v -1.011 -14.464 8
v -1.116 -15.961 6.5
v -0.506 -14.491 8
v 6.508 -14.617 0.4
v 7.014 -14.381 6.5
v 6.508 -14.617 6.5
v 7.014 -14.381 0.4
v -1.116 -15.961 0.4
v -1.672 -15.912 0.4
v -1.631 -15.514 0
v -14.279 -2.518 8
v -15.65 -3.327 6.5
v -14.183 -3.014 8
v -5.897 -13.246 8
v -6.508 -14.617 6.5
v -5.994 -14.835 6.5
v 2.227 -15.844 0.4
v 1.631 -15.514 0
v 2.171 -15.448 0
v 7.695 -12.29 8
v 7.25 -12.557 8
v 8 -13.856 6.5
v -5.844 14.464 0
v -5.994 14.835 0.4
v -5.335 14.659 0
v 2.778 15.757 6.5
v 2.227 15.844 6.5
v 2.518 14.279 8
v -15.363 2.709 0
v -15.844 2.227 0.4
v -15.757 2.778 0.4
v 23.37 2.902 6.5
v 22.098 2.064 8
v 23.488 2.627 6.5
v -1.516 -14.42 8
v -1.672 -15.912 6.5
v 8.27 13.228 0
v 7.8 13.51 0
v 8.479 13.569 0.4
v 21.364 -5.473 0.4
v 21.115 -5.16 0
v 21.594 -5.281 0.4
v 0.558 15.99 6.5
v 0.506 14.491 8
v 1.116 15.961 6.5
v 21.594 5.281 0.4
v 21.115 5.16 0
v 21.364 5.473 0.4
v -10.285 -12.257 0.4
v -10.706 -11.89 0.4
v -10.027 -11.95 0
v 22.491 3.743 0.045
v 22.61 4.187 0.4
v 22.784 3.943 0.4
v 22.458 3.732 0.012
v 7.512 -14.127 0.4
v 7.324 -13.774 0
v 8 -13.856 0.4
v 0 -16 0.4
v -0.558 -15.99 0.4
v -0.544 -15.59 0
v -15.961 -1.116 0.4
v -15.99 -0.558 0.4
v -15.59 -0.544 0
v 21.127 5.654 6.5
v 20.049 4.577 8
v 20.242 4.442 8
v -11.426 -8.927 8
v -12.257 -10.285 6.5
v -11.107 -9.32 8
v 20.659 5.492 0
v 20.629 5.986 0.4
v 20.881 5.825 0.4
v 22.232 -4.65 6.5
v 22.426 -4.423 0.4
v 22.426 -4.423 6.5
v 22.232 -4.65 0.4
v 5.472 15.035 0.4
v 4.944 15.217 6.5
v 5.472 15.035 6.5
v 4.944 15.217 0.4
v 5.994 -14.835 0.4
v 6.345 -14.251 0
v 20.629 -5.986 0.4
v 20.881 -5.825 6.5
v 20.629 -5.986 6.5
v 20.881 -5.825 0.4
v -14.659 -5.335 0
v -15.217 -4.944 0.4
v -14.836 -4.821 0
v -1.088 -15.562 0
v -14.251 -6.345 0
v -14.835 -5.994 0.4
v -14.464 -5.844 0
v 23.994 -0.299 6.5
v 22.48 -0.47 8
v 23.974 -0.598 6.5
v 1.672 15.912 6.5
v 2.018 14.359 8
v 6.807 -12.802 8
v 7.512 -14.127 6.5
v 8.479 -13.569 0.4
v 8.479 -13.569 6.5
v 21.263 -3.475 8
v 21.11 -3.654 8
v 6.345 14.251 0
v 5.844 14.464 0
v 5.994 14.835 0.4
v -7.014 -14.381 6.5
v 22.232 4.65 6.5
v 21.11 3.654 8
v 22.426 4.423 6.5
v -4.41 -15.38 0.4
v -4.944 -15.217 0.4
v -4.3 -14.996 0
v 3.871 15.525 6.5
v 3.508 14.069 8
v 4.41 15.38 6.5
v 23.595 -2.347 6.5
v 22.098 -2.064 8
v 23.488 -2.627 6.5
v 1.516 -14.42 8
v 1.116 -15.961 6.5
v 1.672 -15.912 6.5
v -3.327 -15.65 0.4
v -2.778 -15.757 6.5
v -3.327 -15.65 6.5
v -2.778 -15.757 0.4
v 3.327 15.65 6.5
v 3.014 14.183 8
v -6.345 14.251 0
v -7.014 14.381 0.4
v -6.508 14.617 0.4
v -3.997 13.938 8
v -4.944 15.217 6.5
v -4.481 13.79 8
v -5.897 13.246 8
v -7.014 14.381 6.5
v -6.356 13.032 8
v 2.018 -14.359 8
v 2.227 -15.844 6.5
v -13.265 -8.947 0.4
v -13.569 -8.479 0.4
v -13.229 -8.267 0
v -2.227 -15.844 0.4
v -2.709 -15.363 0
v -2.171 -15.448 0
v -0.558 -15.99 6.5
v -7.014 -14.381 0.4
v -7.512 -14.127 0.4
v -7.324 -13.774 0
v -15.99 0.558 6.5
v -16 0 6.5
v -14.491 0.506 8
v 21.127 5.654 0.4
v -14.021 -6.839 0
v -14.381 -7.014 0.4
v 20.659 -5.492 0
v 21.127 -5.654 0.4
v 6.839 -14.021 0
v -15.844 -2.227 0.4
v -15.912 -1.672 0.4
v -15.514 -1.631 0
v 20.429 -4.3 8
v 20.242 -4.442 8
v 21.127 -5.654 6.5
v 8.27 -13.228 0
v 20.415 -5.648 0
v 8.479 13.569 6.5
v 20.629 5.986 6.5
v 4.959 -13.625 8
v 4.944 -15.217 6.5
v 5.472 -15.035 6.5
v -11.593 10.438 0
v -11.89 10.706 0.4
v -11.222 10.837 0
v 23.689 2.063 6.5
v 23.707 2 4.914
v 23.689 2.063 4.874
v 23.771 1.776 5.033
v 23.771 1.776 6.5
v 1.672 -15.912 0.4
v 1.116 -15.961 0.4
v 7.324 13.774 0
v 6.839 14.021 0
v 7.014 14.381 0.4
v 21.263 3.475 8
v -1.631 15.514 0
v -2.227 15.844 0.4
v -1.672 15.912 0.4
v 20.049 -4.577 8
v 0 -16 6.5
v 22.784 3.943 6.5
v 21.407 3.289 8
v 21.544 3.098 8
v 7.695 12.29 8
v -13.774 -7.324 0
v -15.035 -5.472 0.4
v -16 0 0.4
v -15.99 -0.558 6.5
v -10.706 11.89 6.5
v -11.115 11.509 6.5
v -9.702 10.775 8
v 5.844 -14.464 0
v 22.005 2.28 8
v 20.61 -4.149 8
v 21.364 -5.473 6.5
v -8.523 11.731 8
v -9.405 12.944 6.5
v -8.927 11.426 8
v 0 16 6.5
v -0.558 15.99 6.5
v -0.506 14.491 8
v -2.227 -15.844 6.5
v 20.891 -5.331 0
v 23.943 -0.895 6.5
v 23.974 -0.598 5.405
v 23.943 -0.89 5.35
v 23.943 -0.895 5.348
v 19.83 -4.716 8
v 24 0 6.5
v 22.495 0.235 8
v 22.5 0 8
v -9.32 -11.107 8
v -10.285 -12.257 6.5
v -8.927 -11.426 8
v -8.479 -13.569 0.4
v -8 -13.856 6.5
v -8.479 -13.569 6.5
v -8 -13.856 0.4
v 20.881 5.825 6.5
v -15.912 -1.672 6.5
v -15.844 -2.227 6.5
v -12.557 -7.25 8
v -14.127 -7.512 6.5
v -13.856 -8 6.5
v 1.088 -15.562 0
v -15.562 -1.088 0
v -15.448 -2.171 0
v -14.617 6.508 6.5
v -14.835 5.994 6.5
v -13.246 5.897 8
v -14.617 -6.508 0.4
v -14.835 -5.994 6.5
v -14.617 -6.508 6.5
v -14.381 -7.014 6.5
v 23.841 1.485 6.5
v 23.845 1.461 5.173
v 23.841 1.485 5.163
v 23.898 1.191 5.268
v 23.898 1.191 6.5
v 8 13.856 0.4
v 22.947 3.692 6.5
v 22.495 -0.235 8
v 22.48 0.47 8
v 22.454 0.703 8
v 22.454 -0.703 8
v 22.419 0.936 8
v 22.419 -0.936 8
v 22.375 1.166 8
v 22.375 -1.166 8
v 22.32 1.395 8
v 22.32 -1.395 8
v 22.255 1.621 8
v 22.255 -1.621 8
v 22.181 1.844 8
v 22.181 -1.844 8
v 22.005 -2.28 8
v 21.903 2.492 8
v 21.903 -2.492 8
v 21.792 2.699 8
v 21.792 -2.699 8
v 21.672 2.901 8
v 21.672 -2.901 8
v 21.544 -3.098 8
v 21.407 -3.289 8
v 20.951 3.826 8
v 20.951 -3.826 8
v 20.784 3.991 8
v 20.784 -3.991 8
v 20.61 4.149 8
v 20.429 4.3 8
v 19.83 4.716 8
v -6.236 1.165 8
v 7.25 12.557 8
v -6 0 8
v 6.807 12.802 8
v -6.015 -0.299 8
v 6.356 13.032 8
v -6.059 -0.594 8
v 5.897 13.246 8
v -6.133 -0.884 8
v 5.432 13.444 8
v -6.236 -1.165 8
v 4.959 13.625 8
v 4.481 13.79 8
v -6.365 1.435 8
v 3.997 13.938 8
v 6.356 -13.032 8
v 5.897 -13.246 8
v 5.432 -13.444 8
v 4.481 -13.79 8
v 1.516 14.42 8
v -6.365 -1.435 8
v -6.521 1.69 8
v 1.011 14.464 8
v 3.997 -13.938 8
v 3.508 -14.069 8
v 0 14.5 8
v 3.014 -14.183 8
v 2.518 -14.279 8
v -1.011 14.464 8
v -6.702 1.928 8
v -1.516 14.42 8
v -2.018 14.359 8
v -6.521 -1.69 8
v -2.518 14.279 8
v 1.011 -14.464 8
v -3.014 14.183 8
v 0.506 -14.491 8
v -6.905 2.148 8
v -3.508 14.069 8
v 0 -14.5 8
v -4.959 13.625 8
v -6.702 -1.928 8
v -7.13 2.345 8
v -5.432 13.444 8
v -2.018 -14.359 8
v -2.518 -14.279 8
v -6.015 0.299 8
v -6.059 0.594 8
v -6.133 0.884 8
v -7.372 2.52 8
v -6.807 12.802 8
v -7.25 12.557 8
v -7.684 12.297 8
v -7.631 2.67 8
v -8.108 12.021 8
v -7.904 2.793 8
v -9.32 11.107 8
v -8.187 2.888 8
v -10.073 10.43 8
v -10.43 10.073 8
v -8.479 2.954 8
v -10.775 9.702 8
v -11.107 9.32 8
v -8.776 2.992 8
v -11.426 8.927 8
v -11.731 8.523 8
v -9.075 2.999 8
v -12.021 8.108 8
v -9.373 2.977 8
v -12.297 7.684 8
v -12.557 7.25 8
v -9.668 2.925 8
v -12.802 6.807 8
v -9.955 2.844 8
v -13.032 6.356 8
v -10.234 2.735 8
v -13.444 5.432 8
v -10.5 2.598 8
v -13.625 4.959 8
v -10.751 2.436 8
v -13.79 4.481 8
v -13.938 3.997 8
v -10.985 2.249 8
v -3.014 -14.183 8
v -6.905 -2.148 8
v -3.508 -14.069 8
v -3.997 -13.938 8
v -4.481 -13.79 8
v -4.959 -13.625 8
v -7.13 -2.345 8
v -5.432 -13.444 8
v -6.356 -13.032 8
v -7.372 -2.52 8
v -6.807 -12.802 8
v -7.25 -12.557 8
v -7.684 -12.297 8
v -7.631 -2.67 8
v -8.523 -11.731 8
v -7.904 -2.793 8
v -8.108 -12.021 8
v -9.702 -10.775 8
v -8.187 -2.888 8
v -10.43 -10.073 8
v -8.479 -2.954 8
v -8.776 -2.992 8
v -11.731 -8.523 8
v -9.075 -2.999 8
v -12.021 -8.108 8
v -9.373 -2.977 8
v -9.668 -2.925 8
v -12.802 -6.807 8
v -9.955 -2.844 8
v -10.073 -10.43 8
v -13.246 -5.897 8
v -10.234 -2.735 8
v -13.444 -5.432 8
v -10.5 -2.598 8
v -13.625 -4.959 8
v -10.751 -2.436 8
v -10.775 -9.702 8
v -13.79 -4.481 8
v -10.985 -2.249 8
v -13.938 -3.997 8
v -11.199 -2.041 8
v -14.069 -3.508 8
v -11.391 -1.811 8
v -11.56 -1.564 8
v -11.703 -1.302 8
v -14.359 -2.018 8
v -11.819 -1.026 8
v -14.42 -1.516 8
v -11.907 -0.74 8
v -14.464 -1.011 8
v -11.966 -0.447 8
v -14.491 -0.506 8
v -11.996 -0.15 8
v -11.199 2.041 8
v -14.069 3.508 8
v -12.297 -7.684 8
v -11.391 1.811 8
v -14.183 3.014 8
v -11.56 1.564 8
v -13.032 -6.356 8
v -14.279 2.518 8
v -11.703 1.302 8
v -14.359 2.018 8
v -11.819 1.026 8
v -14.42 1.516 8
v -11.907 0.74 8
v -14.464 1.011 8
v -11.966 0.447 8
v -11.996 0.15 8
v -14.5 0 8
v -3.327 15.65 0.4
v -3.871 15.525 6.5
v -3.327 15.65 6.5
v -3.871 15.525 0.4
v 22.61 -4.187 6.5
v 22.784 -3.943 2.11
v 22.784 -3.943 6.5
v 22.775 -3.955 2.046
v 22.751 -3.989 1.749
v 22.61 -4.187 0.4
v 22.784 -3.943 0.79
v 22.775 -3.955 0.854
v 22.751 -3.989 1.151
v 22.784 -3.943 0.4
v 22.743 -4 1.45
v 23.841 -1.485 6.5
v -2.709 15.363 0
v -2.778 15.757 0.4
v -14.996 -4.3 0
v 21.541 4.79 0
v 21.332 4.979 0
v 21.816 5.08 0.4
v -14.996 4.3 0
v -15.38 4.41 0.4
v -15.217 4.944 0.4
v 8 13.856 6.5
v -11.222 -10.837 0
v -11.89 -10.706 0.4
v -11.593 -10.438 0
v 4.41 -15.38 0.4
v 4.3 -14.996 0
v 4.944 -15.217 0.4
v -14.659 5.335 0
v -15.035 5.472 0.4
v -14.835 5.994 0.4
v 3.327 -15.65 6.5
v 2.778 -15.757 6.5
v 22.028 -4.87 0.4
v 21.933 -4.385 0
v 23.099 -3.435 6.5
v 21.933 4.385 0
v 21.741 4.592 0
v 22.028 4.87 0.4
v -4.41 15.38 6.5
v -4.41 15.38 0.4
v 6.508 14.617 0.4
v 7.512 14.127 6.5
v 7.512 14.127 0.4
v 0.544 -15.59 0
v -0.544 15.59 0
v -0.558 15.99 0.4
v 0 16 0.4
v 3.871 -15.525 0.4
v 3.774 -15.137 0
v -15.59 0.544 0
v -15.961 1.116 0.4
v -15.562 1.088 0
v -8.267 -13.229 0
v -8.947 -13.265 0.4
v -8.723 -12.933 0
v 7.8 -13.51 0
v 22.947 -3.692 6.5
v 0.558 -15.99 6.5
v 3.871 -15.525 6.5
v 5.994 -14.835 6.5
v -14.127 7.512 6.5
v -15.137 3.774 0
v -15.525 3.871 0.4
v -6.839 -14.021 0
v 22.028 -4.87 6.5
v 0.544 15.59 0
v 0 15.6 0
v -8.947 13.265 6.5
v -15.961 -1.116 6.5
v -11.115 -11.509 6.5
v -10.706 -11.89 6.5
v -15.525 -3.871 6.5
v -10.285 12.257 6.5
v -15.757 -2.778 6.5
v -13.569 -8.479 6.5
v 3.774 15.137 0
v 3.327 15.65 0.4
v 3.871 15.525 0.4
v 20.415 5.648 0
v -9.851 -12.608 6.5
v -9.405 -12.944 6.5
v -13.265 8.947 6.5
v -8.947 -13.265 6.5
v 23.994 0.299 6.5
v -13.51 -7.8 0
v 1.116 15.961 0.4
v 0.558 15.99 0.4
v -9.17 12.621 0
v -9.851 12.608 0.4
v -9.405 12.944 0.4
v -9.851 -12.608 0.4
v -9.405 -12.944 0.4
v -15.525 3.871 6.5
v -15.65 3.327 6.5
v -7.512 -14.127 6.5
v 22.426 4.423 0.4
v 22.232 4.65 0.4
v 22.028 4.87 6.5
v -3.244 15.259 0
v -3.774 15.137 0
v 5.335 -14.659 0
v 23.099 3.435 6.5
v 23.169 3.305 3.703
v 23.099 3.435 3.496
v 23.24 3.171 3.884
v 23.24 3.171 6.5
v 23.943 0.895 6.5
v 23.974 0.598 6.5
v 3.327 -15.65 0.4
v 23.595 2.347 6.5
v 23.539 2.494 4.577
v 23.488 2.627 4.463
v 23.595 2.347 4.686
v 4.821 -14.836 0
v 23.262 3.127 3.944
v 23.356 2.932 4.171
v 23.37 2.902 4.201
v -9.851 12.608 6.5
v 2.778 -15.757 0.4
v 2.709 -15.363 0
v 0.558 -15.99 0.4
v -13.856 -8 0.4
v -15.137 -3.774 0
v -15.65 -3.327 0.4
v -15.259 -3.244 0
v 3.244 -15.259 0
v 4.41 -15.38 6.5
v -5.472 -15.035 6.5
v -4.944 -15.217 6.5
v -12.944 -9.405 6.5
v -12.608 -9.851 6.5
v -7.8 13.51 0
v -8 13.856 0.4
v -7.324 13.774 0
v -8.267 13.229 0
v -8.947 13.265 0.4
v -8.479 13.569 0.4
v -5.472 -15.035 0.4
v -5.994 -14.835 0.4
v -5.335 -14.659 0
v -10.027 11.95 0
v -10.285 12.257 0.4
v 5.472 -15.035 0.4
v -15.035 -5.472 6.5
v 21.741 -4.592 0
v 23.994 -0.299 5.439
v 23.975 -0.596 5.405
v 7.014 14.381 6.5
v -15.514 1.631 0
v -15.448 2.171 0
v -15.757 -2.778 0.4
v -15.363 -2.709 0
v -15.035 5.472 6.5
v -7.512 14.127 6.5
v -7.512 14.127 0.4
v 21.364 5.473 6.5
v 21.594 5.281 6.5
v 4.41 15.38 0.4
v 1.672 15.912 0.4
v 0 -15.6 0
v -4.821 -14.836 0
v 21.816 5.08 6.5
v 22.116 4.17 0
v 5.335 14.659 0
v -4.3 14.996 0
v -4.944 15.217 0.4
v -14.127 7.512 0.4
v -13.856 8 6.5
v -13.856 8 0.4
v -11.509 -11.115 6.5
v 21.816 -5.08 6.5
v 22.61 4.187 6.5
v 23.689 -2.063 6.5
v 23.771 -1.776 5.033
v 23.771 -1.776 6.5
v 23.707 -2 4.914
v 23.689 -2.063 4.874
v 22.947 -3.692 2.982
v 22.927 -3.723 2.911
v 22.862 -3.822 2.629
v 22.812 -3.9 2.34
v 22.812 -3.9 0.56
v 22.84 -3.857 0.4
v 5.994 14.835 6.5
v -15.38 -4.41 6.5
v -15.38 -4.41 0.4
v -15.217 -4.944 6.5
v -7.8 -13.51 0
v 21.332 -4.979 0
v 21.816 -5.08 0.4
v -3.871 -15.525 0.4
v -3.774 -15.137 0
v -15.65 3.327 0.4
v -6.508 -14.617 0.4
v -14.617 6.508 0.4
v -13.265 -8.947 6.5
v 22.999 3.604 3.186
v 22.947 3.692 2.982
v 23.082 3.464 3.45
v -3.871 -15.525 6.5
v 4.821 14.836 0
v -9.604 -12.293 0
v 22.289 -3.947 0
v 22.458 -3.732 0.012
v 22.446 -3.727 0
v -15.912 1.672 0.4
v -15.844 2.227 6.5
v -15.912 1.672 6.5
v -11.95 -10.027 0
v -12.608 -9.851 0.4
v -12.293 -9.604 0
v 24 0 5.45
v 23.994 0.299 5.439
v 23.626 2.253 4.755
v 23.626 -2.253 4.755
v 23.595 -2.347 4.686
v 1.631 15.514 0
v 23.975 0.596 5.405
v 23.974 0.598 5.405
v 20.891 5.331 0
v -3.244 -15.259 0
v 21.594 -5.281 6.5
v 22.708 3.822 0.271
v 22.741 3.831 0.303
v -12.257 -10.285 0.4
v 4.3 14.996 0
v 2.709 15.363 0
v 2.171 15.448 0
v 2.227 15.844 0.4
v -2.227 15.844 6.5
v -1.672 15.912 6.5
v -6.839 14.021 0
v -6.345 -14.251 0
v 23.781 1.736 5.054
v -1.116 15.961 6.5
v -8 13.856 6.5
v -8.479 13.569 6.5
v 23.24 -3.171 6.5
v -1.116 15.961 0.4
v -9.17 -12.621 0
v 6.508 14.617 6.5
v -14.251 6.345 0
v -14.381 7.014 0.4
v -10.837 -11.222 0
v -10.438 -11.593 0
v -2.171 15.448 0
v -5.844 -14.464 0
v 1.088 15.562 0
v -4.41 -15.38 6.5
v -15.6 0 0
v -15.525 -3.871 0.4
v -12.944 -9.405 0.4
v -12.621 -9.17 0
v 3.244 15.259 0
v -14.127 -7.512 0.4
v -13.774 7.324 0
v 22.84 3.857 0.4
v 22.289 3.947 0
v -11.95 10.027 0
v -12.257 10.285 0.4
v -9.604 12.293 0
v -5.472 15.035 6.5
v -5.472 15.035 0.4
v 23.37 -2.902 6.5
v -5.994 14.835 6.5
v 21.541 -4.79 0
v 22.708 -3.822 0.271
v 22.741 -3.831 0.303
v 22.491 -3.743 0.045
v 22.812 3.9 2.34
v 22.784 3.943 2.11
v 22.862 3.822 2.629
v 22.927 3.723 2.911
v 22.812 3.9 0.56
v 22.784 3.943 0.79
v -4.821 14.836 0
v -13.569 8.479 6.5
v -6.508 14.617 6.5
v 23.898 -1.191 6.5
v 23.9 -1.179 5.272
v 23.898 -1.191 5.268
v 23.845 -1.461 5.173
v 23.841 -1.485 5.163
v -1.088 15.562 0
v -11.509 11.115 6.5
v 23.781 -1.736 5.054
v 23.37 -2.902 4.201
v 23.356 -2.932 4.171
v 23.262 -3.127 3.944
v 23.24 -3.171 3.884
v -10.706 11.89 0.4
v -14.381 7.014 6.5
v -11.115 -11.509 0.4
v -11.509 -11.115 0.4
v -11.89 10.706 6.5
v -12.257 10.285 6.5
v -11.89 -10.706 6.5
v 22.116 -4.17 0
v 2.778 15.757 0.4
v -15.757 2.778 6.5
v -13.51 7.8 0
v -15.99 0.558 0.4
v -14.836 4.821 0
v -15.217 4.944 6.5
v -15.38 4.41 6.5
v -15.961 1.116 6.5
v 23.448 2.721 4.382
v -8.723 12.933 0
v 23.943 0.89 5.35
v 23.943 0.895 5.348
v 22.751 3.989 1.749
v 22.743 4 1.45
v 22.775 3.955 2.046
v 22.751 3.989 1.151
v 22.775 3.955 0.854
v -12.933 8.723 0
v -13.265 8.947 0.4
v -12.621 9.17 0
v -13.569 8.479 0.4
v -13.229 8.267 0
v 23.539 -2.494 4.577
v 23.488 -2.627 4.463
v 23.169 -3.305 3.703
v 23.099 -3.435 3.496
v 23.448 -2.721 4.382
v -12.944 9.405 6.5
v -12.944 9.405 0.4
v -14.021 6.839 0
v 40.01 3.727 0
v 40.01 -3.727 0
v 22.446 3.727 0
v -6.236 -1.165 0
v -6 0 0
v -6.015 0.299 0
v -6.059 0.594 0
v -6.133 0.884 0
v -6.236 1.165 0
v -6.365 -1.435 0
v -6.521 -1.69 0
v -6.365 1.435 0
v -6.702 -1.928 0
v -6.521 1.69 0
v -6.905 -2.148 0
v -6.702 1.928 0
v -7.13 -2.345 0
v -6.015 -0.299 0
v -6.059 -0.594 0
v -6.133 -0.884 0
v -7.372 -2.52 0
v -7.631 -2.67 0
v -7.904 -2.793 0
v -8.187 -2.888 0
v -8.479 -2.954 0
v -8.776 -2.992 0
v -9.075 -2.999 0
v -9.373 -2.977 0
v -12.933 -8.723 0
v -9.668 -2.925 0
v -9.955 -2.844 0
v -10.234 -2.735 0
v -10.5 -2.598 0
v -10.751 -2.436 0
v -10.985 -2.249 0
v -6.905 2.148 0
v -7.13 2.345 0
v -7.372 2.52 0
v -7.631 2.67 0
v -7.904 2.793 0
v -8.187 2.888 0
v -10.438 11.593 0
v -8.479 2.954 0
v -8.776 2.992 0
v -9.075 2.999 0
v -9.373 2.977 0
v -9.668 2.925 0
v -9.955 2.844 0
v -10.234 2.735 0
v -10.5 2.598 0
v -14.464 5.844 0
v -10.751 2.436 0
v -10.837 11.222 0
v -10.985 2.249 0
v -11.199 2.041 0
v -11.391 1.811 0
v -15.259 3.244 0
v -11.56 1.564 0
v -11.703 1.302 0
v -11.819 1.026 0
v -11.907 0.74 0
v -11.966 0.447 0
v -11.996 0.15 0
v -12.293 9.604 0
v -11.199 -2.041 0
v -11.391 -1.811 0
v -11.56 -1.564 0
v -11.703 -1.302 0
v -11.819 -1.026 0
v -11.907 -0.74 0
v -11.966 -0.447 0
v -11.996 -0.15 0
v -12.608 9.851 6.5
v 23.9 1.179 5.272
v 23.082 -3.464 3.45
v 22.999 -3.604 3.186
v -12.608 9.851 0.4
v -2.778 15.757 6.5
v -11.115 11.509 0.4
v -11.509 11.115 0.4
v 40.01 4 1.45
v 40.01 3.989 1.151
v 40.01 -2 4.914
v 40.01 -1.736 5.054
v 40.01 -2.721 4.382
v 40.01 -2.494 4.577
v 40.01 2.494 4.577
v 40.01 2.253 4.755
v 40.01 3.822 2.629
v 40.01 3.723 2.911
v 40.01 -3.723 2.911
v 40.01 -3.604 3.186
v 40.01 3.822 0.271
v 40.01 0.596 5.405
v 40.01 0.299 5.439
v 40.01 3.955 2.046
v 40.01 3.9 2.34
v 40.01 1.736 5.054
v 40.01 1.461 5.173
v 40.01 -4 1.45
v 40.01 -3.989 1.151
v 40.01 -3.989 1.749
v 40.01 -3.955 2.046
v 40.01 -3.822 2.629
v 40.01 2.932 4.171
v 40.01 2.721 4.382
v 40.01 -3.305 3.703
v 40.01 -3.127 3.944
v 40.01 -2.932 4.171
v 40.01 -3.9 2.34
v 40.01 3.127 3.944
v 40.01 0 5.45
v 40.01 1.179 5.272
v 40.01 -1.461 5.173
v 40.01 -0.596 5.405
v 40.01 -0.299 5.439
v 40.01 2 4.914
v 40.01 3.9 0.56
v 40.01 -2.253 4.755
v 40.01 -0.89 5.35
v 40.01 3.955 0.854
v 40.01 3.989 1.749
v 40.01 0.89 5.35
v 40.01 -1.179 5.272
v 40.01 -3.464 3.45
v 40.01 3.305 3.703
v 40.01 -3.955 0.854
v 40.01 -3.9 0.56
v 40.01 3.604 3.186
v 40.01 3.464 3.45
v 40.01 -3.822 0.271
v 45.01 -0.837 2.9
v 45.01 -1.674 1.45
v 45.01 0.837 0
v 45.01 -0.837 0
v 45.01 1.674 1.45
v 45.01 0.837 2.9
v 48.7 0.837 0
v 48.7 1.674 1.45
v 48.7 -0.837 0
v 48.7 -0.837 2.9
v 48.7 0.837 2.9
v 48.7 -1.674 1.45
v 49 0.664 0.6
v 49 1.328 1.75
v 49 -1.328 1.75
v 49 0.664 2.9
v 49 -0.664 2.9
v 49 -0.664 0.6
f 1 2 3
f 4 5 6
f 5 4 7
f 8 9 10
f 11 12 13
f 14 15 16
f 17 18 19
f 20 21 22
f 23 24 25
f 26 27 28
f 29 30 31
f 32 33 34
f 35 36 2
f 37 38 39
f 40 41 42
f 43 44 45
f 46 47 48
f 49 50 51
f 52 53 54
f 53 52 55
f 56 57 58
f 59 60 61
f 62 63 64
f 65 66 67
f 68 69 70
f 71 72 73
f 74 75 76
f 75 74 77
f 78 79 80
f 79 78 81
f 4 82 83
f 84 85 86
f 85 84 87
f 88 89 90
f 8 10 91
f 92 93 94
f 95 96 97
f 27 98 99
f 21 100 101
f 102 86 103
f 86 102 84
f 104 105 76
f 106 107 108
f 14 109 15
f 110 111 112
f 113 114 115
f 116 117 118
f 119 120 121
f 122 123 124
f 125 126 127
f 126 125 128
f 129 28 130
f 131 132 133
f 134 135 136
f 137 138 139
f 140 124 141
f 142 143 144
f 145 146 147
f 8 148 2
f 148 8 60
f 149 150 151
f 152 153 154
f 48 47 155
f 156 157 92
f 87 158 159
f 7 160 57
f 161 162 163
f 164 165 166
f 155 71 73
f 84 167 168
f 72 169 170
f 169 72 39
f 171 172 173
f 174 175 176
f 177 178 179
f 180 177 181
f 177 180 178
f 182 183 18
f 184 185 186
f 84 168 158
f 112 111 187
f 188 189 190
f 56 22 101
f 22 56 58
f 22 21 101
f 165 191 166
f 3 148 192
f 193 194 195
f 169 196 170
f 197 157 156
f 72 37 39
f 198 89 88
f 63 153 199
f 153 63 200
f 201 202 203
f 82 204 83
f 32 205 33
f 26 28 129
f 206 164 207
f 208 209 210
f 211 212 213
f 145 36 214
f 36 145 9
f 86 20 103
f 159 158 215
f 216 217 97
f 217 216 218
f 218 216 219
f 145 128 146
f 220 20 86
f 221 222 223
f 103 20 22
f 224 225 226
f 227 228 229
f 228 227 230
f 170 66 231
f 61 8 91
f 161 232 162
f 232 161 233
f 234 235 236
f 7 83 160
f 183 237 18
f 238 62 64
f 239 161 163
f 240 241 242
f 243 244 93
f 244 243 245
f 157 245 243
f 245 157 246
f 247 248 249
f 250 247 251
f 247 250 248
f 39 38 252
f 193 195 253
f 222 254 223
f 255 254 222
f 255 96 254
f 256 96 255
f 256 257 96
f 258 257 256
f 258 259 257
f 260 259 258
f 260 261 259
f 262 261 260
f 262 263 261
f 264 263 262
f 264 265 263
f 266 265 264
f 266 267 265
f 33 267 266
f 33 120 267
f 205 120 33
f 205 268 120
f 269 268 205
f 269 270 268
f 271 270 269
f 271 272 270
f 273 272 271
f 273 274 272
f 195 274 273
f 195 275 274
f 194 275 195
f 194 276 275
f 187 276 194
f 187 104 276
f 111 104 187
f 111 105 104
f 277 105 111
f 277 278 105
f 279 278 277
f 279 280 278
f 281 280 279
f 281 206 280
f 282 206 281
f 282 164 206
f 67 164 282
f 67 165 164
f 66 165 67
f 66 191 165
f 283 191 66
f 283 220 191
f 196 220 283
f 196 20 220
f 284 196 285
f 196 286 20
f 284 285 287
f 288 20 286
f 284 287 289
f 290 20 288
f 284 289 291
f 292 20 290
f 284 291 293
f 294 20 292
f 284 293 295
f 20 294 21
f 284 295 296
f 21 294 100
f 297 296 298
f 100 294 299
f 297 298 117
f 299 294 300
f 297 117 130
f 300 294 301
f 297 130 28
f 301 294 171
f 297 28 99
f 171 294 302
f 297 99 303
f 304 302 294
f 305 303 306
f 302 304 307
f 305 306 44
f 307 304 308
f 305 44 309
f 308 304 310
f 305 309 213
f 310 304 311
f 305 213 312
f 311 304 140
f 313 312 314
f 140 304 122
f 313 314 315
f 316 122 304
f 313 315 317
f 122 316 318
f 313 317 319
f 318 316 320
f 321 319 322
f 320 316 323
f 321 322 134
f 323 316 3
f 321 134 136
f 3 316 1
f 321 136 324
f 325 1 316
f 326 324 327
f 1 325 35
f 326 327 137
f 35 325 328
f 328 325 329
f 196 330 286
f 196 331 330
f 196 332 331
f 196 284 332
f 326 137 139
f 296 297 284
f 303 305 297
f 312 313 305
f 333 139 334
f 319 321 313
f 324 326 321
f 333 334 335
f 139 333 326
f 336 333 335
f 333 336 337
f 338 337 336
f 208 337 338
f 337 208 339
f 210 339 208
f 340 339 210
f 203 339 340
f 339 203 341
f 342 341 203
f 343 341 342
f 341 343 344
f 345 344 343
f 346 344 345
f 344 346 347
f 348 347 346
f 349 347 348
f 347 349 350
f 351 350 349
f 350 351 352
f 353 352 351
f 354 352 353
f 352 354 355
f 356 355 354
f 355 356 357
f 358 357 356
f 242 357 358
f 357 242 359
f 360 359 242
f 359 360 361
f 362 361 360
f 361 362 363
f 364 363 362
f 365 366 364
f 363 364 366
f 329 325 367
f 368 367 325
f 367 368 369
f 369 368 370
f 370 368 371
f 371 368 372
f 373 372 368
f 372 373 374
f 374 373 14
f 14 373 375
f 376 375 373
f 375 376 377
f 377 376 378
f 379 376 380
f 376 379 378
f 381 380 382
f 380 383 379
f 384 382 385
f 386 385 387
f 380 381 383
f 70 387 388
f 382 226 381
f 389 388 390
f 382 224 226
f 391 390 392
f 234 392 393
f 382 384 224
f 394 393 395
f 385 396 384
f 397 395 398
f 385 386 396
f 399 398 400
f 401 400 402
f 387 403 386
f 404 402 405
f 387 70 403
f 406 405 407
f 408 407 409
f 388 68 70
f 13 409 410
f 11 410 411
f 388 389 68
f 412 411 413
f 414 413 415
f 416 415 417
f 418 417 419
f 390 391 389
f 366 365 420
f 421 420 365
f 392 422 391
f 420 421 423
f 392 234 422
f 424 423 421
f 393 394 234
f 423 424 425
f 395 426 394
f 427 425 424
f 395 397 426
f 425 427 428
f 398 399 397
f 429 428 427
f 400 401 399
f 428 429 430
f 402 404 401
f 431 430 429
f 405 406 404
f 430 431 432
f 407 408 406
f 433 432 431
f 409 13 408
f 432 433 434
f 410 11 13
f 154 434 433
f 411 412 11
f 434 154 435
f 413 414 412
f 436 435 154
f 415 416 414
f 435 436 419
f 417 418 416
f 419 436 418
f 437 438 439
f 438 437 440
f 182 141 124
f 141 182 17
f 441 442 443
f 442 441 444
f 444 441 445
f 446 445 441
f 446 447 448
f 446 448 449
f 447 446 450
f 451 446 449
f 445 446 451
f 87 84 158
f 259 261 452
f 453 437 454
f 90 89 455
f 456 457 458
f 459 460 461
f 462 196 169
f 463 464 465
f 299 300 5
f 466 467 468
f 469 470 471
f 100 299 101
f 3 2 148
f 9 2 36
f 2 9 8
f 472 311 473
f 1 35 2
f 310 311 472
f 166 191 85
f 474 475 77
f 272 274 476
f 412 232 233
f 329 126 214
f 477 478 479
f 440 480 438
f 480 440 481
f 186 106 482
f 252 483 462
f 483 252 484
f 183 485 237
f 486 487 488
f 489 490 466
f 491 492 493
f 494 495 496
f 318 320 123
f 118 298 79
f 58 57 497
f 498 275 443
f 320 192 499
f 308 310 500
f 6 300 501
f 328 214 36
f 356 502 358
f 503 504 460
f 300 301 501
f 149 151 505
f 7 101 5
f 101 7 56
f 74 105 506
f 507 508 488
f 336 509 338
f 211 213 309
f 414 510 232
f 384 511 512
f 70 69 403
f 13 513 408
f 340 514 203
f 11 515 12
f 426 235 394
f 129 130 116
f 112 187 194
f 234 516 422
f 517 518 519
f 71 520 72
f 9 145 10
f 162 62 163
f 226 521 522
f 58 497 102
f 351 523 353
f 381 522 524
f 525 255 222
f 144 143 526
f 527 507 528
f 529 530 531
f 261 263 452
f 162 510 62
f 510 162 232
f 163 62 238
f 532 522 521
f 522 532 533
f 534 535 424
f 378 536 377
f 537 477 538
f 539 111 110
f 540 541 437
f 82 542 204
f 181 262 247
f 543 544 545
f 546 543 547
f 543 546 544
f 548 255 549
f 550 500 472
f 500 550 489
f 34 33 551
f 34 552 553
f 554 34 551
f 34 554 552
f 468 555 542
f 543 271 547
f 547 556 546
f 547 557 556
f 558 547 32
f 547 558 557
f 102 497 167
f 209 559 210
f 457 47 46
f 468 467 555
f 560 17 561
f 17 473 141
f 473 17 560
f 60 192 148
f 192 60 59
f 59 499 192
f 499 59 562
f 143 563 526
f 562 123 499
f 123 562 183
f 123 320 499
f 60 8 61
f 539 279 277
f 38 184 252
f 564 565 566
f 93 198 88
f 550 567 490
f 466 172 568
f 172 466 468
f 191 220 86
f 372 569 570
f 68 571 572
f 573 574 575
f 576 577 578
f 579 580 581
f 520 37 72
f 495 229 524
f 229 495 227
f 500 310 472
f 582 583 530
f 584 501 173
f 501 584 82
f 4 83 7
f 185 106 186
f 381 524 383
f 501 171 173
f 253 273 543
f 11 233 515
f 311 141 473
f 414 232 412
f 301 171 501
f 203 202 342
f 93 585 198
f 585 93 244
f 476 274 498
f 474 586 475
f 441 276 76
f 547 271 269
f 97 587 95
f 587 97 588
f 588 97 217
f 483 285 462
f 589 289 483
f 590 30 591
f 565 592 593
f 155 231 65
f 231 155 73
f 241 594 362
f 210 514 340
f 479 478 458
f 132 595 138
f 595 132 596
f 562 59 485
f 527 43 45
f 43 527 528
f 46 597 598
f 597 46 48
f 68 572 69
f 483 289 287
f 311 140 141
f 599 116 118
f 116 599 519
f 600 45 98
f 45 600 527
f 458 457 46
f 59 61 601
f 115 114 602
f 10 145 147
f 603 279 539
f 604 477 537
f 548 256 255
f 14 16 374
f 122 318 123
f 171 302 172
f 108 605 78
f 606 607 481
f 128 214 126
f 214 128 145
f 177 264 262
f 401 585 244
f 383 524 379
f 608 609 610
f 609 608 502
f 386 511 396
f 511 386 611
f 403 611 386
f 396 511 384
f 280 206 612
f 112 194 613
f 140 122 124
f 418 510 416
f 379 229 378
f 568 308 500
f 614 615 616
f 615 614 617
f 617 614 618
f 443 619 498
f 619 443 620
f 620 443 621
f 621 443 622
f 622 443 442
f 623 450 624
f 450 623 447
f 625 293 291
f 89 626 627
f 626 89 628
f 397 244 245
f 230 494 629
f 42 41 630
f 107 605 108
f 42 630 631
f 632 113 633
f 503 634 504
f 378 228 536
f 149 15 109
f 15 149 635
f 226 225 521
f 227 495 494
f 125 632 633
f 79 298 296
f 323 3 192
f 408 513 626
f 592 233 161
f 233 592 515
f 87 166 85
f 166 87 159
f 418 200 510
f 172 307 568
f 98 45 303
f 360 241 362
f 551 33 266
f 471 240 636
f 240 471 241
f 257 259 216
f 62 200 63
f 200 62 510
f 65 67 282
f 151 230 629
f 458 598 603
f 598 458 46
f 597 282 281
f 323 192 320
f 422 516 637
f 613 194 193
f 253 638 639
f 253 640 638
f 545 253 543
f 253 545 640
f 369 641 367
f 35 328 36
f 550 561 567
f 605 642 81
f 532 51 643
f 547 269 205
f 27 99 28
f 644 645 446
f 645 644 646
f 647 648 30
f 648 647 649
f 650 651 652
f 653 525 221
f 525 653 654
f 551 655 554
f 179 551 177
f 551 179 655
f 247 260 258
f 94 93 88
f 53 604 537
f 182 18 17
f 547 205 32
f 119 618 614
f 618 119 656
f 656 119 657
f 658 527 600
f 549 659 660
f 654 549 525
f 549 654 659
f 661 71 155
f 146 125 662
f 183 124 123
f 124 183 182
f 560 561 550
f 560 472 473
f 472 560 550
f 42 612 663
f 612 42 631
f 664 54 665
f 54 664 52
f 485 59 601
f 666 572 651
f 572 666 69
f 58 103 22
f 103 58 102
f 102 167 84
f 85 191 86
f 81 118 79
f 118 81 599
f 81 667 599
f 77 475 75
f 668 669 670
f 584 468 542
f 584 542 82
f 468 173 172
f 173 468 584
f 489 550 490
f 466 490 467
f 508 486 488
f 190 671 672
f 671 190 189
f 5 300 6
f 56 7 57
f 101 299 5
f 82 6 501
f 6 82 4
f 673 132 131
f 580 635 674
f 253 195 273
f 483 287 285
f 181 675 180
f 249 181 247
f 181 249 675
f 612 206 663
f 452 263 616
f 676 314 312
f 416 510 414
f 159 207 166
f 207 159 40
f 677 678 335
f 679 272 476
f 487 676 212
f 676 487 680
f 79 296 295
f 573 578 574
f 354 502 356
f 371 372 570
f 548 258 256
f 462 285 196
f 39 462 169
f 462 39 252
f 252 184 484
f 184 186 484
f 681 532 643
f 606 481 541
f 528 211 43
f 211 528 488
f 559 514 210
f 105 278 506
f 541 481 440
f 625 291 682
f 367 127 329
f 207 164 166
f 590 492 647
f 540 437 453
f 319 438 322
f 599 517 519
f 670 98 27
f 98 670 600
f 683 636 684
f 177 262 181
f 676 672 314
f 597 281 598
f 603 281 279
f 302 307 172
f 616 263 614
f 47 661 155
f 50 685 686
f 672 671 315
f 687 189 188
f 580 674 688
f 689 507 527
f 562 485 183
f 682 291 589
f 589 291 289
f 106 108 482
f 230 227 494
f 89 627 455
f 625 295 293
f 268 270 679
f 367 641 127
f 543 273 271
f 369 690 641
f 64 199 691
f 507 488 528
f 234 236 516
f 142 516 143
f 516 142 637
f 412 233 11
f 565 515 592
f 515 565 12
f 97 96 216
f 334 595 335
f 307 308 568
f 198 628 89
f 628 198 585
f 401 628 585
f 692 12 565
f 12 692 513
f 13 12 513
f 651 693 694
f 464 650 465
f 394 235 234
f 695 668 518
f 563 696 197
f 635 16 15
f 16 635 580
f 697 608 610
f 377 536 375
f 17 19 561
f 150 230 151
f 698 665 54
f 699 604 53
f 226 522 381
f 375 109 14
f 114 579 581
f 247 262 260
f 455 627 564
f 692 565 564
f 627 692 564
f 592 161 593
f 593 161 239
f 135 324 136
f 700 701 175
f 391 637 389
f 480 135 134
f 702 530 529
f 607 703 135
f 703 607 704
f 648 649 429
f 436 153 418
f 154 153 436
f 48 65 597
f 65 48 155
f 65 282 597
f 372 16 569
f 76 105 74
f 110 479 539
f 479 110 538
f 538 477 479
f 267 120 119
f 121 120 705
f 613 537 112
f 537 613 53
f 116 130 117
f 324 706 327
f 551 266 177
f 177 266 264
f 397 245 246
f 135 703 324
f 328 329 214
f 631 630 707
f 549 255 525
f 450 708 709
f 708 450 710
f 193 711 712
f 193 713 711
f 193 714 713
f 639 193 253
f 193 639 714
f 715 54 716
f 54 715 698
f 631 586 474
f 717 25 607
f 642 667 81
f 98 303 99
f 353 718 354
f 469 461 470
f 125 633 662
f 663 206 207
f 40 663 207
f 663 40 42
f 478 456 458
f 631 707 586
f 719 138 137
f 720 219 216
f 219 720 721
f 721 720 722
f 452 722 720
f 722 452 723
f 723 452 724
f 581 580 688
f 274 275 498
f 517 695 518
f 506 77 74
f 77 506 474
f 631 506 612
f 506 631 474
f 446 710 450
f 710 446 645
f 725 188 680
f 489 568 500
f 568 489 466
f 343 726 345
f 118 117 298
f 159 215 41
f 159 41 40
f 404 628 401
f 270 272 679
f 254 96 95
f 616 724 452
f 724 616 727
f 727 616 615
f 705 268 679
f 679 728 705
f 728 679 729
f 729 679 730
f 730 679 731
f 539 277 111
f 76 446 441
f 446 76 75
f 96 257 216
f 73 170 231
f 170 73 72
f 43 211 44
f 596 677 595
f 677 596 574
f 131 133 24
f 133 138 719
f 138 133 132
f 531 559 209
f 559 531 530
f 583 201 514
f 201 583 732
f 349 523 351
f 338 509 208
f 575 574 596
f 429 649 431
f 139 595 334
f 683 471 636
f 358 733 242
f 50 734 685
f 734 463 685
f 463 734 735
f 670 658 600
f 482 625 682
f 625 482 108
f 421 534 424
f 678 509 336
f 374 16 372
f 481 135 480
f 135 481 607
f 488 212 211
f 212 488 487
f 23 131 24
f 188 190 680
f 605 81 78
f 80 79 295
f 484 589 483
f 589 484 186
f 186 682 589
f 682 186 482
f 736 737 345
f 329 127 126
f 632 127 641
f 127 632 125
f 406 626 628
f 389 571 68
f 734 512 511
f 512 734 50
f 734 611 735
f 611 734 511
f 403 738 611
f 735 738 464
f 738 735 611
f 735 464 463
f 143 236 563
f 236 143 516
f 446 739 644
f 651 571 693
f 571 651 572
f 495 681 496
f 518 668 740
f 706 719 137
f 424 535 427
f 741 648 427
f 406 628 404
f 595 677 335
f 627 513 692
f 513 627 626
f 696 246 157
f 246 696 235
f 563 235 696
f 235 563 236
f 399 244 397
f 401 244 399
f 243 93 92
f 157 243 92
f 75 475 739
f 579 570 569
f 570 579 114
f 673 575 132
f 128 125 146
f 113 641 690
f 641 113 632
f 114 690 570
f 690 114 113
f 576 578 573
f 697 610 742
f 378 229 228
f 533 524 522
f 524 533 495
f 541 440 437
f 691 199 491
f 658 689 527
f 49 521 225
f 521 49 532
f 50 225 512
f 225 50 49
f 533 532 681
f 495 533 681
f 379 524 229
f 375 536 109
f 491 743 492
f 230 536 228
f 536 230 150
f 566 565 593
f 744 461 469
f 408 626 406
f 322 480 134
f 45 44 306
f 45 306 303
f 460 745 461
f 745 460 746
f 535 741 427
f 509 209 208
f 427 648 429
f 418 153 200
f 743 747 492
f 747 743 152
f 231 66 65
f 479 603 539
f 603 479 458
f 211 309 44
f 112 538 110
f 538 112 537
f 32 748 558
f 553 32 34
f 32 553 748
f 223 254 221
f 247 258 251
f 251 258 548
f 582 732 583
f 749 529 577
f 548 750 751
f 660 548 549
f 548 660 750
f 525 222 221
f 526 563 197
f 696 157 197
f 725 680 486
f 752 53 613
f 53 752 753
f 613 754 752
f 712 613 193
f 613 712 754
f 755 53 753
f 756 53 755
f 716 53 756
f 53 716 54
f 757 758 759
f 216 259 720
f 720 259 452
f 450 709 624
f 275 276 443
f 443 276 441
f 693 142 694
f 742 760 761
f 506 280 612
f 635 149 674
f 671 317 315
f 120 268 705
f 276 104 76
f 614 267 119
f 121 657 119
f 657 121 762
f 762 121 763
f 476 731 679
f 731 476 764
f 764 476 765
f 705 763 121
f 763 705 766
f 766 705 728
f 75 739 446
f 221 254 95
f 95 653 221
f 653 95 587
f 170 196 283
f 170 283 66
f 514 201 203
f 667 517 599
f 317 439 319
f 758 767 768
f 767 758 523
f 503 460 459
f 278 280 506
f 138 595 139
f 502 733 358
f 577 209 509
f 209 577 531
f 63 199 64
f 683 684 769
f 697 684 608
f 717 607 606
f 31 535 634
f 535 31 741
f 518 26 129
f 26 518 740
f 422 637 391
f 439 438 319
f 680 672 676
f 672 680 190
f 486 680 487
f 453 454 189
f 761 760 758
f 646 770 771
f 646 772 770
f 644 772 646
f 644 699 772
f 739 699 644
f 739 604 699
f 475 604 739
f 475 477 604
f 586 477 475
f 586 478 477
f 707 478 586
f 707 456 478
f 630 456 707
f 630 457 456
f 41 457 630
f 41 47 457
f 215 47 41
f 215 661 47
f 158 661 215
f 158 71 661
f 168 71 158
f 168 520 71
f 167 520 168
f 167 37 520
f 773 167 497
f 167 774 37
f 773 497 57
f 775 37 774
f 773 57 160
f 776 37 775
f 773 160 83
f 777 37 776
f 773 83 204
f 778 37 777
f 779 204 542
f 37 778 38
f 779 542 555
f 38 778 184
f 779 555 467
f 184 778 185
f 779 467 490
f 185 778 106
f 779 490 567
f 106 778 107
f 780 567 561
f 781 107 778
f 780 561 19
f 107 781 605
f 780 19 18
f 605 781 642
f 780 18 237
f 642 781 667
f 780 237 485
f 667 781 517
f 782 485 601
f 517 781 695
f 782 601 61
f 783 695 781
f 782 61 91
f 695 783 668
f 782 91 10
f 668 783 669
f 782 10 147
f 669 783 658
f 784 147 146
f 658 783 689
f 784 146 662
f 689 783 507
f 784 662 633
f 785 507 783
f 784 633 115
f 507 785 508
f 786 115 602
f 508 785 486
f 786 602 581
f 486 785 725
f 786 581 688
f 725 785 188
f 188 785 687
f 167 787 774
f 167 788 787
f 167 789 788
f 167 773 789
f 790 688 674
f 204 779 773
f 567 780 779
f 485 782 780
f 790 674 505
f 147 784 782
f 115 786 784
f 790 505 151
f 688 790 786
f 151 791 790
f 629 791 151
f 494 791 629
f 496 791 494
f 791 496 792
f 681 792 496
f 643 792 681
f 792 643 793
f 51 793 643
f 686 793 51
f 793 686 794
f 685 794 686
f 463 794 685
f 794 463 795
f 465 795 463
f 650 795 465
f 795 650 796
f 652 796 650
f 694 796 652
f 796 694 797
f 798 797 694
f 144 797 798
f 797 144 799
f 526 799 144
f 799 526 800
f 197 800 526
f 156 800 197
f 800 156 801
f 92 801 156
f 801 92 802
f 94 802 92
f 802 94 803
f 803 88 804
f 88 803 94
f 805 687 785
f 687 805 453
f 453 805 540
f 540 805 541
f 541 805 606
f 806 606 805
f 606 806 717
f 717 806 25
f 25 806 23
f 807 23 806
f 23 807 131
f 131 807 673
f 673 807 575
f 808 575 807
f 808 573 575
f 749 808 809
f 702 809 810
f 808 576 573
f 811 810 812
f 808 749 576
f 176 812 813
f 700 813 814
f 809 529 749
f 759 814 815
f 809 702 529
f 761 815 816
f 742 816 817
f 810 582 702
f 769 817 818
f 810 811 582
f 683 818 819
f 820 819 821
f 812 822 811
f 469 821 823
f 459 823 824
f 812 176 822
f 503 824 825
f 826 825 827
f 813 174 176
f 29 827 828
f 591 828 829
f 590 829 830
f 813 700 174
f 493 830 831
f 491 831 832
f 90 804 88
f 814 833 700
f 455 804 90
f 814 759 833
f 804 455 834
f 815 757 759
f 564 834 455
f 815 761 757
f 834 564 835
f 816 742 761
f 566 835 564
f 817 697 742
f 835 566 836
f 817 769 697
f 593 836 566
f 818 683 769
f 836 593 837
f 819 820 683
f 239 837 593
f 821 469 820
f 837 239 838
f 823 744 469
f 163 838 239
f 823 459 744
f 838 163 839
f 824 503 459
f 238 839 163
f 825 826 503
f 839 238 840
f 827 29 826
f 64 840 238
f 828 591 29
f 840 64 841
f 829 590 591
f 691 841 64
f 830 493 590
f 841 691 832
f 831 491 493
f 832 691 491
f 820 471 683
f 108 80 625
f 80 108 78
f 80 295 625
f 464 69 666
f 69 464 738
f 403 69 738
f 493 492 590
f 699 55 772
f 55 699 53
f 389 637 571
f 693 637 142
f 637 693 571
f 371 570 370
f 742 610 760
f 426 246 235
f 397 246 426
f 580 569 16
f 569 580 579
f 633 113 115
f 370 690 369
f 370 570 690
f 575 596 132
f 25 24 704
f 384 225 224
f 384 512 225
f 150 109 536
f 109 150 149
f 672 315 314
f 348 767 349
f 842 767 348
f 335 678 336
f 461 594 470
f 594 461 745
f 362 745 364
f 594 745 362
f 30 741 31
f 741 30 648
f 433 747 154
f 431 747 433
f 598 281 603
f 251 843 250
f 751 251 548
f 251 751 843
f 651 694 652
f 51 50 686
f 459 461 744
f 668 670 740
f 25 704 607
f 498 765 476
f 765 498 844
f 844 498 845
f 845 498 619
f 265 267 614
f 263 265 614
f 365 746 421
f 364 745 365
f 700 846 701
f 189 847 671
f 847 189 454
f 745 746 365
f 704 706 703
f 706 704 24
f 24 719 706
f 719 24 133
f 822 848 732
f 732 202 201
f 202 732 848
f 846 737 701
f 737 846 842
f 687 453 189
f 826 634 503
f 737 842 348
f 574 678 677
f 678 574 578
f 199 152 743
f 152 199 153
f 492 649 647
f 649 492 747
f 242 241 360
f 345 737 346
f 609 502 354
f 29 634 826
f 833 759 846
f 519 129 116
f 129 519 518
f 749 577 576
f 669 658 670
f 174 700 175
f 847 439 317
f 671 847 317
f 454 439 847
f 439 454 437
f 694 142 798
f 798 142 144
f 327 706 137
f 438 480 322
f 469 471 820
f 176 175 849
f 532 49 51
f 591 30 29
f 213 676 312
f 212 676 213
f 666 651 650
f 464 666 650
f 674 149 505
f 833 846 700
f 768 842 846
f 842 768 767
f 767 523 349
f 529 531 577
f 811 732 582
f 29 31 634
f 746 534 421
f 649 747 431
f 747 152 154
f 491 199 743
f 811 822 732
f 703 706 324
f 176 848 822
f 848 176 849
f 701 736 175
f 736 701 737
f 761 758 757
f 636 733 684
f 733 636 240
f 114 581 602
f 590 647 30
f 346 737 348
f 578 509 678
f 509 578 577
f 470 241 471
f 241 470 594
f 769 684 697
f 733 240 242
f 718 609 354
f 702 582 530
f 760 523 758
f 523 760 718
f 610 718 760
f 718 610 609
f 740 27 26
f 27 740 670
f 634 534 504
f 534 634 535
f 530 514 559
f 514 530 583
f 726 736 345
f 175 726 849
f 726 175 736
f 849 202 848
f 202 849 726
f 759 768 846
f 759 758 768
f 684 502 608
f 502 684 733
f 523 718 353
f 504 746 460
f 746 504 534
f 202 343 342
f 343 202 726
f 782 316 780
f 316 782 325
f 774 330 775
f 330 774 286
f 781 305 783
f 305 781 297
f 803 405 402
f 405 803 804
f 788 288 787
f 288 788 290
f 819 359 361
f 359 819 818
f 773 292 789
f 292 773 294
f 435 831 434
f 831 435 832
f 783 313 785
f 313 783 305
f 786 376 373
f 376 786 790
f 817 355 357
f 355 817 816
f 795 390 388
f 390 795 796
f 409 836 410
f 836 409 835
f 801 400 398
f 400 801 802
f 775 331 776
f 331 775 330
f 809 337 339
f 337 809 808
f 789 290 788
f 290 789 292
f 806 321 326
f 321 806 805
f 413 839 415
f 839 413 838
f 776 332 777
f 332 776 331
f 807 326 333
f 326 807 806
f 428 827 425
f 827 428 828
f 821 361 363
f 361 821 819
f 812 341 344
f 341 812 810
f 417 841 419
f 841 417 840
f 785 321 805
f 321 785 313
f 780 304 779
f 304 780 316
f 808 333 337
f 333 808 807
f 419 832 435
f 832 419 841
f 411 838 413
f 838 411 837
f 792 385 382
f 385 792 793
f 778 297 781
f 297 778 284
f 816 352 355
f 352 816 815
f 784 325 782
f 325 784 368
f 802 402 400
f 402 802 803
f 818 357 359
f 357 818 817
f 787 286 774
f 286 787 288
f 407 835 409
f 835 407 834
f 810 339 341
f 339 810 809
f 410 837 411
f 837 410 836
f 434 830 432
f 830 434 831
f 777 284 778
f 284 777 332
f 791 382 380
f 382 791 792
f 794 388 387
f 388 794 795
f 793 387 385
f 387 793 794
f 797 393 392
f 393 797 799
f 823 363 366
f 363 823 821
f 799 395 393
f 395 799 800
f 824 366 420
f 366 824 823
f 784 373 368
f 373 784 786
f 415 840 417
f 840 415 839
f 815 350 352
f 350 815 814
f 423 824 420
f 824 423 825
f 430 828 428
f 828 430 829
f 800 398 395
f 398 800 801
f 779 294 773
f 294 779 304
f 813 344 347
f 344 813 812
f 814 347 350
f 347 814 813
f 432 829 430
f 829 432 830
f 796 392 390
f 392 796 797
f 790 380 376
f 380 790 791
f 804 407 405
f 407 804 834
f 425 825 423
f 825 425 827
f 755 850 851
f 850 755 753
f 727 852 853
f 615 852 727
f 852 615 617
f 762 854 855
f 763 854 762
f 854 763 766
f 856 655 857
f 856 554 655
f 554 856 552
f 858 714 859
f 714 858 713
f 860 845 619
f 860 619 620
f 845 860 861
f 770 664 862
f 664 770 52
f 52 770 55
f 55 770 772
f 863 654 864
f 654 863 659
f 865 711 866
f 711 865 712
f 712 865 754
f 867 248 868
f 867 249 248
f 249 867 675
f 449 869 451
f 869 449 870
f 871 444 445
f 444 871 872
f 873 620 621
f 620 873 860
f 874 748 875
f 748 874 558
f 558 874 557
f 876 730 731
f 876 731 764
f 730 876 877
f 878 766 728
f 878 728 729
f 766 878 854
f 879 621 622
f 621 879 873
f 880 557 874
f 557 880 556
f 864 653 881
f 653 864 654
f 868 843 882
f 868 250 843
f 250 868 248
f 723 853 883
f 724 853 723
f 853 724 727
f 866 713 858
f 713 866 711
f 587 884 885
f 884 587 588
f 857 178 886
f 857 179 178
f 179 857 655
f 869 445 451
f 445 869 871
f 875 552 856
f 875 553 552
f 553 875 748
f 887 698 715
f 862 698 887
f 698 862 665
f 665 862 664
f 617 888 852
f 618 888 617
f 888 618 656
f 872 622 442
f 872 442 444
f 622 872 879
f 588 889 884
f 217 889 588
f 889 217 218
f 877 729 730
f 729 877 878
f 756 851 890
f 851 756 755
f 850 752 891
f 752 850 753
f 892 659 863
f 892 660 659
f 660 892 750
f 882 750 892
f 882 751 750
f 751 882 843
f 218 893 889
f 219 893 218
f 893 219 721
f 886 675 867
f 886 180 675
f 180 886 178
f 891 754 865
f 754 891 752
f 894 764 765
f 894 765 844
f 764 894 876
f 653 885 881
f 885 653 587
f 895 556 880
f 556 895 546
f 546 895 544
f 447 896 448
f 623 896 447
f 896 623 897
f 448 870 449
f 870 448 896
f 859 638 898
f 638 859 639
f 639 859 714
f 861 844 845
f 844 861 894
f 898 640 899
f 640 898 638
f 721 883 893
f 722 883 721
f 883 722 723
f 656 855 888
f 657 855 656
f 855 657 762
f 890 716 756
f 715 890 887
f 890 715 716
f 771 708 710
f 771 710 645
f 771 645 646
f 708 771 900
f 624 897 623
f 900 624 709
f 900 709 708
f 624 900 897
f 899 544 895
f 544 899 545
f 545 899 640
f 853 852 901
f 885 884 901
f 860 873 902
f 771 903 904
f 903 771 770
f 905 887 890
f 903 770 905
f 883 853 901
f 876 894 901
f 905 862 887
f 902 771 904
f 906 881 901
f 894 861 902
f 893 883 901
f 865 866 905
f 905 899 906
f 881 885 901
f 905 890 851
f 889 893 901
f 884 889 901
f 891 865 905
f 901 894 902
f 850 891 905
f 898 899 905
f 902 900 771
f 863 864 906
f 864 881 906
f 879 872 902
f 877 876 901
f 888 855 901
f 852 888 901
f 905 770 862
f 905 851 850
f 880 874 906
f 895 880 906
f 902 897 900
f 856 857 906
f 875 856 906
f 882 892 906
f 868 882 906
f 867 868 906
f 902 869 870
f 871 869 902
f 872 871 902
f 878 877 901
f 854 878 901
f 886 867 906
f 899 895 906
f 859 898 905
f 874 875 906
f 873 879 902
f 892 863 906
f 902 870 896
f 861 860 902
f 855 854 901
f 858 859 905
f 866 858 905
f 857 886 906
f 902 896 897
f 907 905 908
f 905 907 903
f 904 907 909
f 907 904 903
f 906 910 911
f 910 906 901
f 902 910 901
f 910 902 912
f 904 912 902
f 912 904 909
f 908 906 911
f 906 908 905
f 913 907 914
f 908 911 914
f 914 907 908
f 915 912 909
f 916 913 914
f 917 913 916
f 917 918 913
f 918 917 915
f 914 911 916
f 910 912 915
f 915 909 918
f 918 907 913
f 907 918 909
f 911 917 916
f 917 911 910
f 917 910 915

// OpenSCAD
// screwdriver — a kid's hex key for the cone pin (models/cone-pin).
//
// The cone pin's foot has a hex socket (lib/charm-cone.scad: `cn_key`). This
// is the key that fits it, on a big flat paddle a small hand can pinch and
// twist like a door key. Push the bit into the pin's foot from under the
// band, hold the paddle still, and screw the charm on or off above.
//
// PRINT IT LYING FLAT, on the paddle's underside, exactly as this file lays
// it out. The bit lies on one of its flats, so its layers run ALONG it and a
// twist shears the layers lengthways, not apart. No support, no brim.

$fa = 2;
$fs = 0.3;

include <../../lib/charm-cone.scad>

// ------------------------------------------------------------------- bit
key_fit   = 0.05;   // the bit is this much under `cn_key` a side, on top of
                    //   the socket's own `cn_key_fit`: a printed key prints
                    //   a little fat sideways, where a steel one doesn't
key_len   = 4.0;    // the straight hex: the socket's depth + the foot's
                    //   recess (2.9 mm), plus a millimetre to spare
key_ch    = 0.3;    // the tip's chamfer, to find the socket's lead-in

// ----------------------------------------------------------------- shaft
shaft_r   = 4.0;    // the round shaft, cut flat where it meets the bed
shaft_len = 16;     // from the paddle to the start of the taper
taper_len = 5;      // shaft down to the bit

// ---------------------------------------------------------------- paddle
paddle_d  = 32;     // the round back of the paddle
paddle_nd = 14;     // where it narrows into the shaft
paddle_len = 40;    // centre of the back to the front edge
paddle_t  = 8;      // its thickness
paddle_ch = 1.5;    // the top edge's chamfer, for small fingers
foot_ch   = 0.4;    // the bottom edge's chamfer, for the elephant's foot
loop_d    = 6;      // a hole for a string, so it stays with the bracelet
loop_wall = 4;      // paddle left behind the hole

// --------------------------------------------------------------- derived
key_af = cn_key - 2*key_fit;                  // 2.80 across flats
key_z  = key_af / 2;                          // the tool's axis: the bit
                                              //   lies on a flat at z = 0
neck_x = paddle_len - paddle_d/2;             // paddle's front edge
bit_x  = neck_x + shaft_len + taper_len;      // where the straight hex starts
tip_x  = bit_x + key_len;                     // overall length

assert(key_af < cn_key_af, "the bit is no smaller than the socket");
assert(key_len > cn_key_d + cn_recess, "the bit can't reach the socket's end");
assert(shaft_r > key_z, "the shaft must reach down to the bed");
assert(paddle_t > 2*shaft_r - key_z - 1, "the shaft stands above the paddle");

echo(str("screwdriver: ", tip_x + paddle_d/2, " mm long, a ", key_af,
         " mm hex bit (socket ", cn_key_af, ", ", (cn_key_af - key_af)/2,
         " a side), ", key_len, " long"));

// A hex prism along +x, lying on a flat at z = 0 from x = 0 to `len`.
module hex_x(af, len)
    translate([0, 0, key_z]) rotate([0, 90, 0])
        linear_extrude(len)
            polygon([for (k = [0 : 5]) (af / sqrt(3)) *
                     [cos(30 + 60*k), sin(30 + 60*k)]]);

// A thin slice of the shaft at x: round, with its underside cut flat on the
// bed (the circle's flank meets the bed 21 deg off vertical).
module shaft_slice(x)
    translate([x, 0, 0]) intersection() {
        translate([0, 0, key_z]) rotate([0, 90, 0])
            cylinder(r = shaft_r, h = 0.01);
        translate([-1, -shaft_r, 0]) cube([2, 2*shaft_r, 2*shaft_r]);
    }

// The paddle's outline: a round back narrowing to the shaft.
module paddle_outline(d = 0)
    offset(delta = d) hull() {
        circle(d = paddle_d);
        translate([neck_x - paddle_nd/2, 0]) circle(d = paddle_nd);
    }

module paddle() difference() {
    hull() {
        linear_extrude(0.01) paddle_outline(-foot_ch);
        translate([0, 0, foot_ch])
            linear_extrude(paddle_t - foot_ch - paddle_ch)
                paddle_outline();
        translate([0, 0, paddle_t - 0.01])
            linear_extrude(0.01) paddle_outline(-paddle_ch);
    }
    translate([-paddle_d/2 + loop_wall + loop_d/2, 0, -1])
        cylinder(d = loop_d, h = paddle_t + 2);
}

module screwdriver() {
    paddle();
    // the shaft, from inside the paddle out to the taper
    hull() {
        shaft_slice(neck_x - paddle_nd/2);
        shaft_slice(neck_x + shaft_len);
    }
    // the taper, from the shaft down onto the bit
    hull() {
        shaft_slice(neck_x + shaft_len);
        translate([bit_x - 0.01, 0, 0]) hex_x(key_af, 0.02);
    }
    // the bit, with a chamfered tip
    translate([bit_x, 0, 0]) hex_x(key_af, key_len - key_ch);
    hull() {
        translate([tip_x - key_ch - 0.01, 0, 0]) hex_x(key_af, 0.01);
        translate([tip_x - 0.01, 0, key_ch]) hex_x(key_af - 2*key_ch, 0.01);
    }
}

screwdriver();
